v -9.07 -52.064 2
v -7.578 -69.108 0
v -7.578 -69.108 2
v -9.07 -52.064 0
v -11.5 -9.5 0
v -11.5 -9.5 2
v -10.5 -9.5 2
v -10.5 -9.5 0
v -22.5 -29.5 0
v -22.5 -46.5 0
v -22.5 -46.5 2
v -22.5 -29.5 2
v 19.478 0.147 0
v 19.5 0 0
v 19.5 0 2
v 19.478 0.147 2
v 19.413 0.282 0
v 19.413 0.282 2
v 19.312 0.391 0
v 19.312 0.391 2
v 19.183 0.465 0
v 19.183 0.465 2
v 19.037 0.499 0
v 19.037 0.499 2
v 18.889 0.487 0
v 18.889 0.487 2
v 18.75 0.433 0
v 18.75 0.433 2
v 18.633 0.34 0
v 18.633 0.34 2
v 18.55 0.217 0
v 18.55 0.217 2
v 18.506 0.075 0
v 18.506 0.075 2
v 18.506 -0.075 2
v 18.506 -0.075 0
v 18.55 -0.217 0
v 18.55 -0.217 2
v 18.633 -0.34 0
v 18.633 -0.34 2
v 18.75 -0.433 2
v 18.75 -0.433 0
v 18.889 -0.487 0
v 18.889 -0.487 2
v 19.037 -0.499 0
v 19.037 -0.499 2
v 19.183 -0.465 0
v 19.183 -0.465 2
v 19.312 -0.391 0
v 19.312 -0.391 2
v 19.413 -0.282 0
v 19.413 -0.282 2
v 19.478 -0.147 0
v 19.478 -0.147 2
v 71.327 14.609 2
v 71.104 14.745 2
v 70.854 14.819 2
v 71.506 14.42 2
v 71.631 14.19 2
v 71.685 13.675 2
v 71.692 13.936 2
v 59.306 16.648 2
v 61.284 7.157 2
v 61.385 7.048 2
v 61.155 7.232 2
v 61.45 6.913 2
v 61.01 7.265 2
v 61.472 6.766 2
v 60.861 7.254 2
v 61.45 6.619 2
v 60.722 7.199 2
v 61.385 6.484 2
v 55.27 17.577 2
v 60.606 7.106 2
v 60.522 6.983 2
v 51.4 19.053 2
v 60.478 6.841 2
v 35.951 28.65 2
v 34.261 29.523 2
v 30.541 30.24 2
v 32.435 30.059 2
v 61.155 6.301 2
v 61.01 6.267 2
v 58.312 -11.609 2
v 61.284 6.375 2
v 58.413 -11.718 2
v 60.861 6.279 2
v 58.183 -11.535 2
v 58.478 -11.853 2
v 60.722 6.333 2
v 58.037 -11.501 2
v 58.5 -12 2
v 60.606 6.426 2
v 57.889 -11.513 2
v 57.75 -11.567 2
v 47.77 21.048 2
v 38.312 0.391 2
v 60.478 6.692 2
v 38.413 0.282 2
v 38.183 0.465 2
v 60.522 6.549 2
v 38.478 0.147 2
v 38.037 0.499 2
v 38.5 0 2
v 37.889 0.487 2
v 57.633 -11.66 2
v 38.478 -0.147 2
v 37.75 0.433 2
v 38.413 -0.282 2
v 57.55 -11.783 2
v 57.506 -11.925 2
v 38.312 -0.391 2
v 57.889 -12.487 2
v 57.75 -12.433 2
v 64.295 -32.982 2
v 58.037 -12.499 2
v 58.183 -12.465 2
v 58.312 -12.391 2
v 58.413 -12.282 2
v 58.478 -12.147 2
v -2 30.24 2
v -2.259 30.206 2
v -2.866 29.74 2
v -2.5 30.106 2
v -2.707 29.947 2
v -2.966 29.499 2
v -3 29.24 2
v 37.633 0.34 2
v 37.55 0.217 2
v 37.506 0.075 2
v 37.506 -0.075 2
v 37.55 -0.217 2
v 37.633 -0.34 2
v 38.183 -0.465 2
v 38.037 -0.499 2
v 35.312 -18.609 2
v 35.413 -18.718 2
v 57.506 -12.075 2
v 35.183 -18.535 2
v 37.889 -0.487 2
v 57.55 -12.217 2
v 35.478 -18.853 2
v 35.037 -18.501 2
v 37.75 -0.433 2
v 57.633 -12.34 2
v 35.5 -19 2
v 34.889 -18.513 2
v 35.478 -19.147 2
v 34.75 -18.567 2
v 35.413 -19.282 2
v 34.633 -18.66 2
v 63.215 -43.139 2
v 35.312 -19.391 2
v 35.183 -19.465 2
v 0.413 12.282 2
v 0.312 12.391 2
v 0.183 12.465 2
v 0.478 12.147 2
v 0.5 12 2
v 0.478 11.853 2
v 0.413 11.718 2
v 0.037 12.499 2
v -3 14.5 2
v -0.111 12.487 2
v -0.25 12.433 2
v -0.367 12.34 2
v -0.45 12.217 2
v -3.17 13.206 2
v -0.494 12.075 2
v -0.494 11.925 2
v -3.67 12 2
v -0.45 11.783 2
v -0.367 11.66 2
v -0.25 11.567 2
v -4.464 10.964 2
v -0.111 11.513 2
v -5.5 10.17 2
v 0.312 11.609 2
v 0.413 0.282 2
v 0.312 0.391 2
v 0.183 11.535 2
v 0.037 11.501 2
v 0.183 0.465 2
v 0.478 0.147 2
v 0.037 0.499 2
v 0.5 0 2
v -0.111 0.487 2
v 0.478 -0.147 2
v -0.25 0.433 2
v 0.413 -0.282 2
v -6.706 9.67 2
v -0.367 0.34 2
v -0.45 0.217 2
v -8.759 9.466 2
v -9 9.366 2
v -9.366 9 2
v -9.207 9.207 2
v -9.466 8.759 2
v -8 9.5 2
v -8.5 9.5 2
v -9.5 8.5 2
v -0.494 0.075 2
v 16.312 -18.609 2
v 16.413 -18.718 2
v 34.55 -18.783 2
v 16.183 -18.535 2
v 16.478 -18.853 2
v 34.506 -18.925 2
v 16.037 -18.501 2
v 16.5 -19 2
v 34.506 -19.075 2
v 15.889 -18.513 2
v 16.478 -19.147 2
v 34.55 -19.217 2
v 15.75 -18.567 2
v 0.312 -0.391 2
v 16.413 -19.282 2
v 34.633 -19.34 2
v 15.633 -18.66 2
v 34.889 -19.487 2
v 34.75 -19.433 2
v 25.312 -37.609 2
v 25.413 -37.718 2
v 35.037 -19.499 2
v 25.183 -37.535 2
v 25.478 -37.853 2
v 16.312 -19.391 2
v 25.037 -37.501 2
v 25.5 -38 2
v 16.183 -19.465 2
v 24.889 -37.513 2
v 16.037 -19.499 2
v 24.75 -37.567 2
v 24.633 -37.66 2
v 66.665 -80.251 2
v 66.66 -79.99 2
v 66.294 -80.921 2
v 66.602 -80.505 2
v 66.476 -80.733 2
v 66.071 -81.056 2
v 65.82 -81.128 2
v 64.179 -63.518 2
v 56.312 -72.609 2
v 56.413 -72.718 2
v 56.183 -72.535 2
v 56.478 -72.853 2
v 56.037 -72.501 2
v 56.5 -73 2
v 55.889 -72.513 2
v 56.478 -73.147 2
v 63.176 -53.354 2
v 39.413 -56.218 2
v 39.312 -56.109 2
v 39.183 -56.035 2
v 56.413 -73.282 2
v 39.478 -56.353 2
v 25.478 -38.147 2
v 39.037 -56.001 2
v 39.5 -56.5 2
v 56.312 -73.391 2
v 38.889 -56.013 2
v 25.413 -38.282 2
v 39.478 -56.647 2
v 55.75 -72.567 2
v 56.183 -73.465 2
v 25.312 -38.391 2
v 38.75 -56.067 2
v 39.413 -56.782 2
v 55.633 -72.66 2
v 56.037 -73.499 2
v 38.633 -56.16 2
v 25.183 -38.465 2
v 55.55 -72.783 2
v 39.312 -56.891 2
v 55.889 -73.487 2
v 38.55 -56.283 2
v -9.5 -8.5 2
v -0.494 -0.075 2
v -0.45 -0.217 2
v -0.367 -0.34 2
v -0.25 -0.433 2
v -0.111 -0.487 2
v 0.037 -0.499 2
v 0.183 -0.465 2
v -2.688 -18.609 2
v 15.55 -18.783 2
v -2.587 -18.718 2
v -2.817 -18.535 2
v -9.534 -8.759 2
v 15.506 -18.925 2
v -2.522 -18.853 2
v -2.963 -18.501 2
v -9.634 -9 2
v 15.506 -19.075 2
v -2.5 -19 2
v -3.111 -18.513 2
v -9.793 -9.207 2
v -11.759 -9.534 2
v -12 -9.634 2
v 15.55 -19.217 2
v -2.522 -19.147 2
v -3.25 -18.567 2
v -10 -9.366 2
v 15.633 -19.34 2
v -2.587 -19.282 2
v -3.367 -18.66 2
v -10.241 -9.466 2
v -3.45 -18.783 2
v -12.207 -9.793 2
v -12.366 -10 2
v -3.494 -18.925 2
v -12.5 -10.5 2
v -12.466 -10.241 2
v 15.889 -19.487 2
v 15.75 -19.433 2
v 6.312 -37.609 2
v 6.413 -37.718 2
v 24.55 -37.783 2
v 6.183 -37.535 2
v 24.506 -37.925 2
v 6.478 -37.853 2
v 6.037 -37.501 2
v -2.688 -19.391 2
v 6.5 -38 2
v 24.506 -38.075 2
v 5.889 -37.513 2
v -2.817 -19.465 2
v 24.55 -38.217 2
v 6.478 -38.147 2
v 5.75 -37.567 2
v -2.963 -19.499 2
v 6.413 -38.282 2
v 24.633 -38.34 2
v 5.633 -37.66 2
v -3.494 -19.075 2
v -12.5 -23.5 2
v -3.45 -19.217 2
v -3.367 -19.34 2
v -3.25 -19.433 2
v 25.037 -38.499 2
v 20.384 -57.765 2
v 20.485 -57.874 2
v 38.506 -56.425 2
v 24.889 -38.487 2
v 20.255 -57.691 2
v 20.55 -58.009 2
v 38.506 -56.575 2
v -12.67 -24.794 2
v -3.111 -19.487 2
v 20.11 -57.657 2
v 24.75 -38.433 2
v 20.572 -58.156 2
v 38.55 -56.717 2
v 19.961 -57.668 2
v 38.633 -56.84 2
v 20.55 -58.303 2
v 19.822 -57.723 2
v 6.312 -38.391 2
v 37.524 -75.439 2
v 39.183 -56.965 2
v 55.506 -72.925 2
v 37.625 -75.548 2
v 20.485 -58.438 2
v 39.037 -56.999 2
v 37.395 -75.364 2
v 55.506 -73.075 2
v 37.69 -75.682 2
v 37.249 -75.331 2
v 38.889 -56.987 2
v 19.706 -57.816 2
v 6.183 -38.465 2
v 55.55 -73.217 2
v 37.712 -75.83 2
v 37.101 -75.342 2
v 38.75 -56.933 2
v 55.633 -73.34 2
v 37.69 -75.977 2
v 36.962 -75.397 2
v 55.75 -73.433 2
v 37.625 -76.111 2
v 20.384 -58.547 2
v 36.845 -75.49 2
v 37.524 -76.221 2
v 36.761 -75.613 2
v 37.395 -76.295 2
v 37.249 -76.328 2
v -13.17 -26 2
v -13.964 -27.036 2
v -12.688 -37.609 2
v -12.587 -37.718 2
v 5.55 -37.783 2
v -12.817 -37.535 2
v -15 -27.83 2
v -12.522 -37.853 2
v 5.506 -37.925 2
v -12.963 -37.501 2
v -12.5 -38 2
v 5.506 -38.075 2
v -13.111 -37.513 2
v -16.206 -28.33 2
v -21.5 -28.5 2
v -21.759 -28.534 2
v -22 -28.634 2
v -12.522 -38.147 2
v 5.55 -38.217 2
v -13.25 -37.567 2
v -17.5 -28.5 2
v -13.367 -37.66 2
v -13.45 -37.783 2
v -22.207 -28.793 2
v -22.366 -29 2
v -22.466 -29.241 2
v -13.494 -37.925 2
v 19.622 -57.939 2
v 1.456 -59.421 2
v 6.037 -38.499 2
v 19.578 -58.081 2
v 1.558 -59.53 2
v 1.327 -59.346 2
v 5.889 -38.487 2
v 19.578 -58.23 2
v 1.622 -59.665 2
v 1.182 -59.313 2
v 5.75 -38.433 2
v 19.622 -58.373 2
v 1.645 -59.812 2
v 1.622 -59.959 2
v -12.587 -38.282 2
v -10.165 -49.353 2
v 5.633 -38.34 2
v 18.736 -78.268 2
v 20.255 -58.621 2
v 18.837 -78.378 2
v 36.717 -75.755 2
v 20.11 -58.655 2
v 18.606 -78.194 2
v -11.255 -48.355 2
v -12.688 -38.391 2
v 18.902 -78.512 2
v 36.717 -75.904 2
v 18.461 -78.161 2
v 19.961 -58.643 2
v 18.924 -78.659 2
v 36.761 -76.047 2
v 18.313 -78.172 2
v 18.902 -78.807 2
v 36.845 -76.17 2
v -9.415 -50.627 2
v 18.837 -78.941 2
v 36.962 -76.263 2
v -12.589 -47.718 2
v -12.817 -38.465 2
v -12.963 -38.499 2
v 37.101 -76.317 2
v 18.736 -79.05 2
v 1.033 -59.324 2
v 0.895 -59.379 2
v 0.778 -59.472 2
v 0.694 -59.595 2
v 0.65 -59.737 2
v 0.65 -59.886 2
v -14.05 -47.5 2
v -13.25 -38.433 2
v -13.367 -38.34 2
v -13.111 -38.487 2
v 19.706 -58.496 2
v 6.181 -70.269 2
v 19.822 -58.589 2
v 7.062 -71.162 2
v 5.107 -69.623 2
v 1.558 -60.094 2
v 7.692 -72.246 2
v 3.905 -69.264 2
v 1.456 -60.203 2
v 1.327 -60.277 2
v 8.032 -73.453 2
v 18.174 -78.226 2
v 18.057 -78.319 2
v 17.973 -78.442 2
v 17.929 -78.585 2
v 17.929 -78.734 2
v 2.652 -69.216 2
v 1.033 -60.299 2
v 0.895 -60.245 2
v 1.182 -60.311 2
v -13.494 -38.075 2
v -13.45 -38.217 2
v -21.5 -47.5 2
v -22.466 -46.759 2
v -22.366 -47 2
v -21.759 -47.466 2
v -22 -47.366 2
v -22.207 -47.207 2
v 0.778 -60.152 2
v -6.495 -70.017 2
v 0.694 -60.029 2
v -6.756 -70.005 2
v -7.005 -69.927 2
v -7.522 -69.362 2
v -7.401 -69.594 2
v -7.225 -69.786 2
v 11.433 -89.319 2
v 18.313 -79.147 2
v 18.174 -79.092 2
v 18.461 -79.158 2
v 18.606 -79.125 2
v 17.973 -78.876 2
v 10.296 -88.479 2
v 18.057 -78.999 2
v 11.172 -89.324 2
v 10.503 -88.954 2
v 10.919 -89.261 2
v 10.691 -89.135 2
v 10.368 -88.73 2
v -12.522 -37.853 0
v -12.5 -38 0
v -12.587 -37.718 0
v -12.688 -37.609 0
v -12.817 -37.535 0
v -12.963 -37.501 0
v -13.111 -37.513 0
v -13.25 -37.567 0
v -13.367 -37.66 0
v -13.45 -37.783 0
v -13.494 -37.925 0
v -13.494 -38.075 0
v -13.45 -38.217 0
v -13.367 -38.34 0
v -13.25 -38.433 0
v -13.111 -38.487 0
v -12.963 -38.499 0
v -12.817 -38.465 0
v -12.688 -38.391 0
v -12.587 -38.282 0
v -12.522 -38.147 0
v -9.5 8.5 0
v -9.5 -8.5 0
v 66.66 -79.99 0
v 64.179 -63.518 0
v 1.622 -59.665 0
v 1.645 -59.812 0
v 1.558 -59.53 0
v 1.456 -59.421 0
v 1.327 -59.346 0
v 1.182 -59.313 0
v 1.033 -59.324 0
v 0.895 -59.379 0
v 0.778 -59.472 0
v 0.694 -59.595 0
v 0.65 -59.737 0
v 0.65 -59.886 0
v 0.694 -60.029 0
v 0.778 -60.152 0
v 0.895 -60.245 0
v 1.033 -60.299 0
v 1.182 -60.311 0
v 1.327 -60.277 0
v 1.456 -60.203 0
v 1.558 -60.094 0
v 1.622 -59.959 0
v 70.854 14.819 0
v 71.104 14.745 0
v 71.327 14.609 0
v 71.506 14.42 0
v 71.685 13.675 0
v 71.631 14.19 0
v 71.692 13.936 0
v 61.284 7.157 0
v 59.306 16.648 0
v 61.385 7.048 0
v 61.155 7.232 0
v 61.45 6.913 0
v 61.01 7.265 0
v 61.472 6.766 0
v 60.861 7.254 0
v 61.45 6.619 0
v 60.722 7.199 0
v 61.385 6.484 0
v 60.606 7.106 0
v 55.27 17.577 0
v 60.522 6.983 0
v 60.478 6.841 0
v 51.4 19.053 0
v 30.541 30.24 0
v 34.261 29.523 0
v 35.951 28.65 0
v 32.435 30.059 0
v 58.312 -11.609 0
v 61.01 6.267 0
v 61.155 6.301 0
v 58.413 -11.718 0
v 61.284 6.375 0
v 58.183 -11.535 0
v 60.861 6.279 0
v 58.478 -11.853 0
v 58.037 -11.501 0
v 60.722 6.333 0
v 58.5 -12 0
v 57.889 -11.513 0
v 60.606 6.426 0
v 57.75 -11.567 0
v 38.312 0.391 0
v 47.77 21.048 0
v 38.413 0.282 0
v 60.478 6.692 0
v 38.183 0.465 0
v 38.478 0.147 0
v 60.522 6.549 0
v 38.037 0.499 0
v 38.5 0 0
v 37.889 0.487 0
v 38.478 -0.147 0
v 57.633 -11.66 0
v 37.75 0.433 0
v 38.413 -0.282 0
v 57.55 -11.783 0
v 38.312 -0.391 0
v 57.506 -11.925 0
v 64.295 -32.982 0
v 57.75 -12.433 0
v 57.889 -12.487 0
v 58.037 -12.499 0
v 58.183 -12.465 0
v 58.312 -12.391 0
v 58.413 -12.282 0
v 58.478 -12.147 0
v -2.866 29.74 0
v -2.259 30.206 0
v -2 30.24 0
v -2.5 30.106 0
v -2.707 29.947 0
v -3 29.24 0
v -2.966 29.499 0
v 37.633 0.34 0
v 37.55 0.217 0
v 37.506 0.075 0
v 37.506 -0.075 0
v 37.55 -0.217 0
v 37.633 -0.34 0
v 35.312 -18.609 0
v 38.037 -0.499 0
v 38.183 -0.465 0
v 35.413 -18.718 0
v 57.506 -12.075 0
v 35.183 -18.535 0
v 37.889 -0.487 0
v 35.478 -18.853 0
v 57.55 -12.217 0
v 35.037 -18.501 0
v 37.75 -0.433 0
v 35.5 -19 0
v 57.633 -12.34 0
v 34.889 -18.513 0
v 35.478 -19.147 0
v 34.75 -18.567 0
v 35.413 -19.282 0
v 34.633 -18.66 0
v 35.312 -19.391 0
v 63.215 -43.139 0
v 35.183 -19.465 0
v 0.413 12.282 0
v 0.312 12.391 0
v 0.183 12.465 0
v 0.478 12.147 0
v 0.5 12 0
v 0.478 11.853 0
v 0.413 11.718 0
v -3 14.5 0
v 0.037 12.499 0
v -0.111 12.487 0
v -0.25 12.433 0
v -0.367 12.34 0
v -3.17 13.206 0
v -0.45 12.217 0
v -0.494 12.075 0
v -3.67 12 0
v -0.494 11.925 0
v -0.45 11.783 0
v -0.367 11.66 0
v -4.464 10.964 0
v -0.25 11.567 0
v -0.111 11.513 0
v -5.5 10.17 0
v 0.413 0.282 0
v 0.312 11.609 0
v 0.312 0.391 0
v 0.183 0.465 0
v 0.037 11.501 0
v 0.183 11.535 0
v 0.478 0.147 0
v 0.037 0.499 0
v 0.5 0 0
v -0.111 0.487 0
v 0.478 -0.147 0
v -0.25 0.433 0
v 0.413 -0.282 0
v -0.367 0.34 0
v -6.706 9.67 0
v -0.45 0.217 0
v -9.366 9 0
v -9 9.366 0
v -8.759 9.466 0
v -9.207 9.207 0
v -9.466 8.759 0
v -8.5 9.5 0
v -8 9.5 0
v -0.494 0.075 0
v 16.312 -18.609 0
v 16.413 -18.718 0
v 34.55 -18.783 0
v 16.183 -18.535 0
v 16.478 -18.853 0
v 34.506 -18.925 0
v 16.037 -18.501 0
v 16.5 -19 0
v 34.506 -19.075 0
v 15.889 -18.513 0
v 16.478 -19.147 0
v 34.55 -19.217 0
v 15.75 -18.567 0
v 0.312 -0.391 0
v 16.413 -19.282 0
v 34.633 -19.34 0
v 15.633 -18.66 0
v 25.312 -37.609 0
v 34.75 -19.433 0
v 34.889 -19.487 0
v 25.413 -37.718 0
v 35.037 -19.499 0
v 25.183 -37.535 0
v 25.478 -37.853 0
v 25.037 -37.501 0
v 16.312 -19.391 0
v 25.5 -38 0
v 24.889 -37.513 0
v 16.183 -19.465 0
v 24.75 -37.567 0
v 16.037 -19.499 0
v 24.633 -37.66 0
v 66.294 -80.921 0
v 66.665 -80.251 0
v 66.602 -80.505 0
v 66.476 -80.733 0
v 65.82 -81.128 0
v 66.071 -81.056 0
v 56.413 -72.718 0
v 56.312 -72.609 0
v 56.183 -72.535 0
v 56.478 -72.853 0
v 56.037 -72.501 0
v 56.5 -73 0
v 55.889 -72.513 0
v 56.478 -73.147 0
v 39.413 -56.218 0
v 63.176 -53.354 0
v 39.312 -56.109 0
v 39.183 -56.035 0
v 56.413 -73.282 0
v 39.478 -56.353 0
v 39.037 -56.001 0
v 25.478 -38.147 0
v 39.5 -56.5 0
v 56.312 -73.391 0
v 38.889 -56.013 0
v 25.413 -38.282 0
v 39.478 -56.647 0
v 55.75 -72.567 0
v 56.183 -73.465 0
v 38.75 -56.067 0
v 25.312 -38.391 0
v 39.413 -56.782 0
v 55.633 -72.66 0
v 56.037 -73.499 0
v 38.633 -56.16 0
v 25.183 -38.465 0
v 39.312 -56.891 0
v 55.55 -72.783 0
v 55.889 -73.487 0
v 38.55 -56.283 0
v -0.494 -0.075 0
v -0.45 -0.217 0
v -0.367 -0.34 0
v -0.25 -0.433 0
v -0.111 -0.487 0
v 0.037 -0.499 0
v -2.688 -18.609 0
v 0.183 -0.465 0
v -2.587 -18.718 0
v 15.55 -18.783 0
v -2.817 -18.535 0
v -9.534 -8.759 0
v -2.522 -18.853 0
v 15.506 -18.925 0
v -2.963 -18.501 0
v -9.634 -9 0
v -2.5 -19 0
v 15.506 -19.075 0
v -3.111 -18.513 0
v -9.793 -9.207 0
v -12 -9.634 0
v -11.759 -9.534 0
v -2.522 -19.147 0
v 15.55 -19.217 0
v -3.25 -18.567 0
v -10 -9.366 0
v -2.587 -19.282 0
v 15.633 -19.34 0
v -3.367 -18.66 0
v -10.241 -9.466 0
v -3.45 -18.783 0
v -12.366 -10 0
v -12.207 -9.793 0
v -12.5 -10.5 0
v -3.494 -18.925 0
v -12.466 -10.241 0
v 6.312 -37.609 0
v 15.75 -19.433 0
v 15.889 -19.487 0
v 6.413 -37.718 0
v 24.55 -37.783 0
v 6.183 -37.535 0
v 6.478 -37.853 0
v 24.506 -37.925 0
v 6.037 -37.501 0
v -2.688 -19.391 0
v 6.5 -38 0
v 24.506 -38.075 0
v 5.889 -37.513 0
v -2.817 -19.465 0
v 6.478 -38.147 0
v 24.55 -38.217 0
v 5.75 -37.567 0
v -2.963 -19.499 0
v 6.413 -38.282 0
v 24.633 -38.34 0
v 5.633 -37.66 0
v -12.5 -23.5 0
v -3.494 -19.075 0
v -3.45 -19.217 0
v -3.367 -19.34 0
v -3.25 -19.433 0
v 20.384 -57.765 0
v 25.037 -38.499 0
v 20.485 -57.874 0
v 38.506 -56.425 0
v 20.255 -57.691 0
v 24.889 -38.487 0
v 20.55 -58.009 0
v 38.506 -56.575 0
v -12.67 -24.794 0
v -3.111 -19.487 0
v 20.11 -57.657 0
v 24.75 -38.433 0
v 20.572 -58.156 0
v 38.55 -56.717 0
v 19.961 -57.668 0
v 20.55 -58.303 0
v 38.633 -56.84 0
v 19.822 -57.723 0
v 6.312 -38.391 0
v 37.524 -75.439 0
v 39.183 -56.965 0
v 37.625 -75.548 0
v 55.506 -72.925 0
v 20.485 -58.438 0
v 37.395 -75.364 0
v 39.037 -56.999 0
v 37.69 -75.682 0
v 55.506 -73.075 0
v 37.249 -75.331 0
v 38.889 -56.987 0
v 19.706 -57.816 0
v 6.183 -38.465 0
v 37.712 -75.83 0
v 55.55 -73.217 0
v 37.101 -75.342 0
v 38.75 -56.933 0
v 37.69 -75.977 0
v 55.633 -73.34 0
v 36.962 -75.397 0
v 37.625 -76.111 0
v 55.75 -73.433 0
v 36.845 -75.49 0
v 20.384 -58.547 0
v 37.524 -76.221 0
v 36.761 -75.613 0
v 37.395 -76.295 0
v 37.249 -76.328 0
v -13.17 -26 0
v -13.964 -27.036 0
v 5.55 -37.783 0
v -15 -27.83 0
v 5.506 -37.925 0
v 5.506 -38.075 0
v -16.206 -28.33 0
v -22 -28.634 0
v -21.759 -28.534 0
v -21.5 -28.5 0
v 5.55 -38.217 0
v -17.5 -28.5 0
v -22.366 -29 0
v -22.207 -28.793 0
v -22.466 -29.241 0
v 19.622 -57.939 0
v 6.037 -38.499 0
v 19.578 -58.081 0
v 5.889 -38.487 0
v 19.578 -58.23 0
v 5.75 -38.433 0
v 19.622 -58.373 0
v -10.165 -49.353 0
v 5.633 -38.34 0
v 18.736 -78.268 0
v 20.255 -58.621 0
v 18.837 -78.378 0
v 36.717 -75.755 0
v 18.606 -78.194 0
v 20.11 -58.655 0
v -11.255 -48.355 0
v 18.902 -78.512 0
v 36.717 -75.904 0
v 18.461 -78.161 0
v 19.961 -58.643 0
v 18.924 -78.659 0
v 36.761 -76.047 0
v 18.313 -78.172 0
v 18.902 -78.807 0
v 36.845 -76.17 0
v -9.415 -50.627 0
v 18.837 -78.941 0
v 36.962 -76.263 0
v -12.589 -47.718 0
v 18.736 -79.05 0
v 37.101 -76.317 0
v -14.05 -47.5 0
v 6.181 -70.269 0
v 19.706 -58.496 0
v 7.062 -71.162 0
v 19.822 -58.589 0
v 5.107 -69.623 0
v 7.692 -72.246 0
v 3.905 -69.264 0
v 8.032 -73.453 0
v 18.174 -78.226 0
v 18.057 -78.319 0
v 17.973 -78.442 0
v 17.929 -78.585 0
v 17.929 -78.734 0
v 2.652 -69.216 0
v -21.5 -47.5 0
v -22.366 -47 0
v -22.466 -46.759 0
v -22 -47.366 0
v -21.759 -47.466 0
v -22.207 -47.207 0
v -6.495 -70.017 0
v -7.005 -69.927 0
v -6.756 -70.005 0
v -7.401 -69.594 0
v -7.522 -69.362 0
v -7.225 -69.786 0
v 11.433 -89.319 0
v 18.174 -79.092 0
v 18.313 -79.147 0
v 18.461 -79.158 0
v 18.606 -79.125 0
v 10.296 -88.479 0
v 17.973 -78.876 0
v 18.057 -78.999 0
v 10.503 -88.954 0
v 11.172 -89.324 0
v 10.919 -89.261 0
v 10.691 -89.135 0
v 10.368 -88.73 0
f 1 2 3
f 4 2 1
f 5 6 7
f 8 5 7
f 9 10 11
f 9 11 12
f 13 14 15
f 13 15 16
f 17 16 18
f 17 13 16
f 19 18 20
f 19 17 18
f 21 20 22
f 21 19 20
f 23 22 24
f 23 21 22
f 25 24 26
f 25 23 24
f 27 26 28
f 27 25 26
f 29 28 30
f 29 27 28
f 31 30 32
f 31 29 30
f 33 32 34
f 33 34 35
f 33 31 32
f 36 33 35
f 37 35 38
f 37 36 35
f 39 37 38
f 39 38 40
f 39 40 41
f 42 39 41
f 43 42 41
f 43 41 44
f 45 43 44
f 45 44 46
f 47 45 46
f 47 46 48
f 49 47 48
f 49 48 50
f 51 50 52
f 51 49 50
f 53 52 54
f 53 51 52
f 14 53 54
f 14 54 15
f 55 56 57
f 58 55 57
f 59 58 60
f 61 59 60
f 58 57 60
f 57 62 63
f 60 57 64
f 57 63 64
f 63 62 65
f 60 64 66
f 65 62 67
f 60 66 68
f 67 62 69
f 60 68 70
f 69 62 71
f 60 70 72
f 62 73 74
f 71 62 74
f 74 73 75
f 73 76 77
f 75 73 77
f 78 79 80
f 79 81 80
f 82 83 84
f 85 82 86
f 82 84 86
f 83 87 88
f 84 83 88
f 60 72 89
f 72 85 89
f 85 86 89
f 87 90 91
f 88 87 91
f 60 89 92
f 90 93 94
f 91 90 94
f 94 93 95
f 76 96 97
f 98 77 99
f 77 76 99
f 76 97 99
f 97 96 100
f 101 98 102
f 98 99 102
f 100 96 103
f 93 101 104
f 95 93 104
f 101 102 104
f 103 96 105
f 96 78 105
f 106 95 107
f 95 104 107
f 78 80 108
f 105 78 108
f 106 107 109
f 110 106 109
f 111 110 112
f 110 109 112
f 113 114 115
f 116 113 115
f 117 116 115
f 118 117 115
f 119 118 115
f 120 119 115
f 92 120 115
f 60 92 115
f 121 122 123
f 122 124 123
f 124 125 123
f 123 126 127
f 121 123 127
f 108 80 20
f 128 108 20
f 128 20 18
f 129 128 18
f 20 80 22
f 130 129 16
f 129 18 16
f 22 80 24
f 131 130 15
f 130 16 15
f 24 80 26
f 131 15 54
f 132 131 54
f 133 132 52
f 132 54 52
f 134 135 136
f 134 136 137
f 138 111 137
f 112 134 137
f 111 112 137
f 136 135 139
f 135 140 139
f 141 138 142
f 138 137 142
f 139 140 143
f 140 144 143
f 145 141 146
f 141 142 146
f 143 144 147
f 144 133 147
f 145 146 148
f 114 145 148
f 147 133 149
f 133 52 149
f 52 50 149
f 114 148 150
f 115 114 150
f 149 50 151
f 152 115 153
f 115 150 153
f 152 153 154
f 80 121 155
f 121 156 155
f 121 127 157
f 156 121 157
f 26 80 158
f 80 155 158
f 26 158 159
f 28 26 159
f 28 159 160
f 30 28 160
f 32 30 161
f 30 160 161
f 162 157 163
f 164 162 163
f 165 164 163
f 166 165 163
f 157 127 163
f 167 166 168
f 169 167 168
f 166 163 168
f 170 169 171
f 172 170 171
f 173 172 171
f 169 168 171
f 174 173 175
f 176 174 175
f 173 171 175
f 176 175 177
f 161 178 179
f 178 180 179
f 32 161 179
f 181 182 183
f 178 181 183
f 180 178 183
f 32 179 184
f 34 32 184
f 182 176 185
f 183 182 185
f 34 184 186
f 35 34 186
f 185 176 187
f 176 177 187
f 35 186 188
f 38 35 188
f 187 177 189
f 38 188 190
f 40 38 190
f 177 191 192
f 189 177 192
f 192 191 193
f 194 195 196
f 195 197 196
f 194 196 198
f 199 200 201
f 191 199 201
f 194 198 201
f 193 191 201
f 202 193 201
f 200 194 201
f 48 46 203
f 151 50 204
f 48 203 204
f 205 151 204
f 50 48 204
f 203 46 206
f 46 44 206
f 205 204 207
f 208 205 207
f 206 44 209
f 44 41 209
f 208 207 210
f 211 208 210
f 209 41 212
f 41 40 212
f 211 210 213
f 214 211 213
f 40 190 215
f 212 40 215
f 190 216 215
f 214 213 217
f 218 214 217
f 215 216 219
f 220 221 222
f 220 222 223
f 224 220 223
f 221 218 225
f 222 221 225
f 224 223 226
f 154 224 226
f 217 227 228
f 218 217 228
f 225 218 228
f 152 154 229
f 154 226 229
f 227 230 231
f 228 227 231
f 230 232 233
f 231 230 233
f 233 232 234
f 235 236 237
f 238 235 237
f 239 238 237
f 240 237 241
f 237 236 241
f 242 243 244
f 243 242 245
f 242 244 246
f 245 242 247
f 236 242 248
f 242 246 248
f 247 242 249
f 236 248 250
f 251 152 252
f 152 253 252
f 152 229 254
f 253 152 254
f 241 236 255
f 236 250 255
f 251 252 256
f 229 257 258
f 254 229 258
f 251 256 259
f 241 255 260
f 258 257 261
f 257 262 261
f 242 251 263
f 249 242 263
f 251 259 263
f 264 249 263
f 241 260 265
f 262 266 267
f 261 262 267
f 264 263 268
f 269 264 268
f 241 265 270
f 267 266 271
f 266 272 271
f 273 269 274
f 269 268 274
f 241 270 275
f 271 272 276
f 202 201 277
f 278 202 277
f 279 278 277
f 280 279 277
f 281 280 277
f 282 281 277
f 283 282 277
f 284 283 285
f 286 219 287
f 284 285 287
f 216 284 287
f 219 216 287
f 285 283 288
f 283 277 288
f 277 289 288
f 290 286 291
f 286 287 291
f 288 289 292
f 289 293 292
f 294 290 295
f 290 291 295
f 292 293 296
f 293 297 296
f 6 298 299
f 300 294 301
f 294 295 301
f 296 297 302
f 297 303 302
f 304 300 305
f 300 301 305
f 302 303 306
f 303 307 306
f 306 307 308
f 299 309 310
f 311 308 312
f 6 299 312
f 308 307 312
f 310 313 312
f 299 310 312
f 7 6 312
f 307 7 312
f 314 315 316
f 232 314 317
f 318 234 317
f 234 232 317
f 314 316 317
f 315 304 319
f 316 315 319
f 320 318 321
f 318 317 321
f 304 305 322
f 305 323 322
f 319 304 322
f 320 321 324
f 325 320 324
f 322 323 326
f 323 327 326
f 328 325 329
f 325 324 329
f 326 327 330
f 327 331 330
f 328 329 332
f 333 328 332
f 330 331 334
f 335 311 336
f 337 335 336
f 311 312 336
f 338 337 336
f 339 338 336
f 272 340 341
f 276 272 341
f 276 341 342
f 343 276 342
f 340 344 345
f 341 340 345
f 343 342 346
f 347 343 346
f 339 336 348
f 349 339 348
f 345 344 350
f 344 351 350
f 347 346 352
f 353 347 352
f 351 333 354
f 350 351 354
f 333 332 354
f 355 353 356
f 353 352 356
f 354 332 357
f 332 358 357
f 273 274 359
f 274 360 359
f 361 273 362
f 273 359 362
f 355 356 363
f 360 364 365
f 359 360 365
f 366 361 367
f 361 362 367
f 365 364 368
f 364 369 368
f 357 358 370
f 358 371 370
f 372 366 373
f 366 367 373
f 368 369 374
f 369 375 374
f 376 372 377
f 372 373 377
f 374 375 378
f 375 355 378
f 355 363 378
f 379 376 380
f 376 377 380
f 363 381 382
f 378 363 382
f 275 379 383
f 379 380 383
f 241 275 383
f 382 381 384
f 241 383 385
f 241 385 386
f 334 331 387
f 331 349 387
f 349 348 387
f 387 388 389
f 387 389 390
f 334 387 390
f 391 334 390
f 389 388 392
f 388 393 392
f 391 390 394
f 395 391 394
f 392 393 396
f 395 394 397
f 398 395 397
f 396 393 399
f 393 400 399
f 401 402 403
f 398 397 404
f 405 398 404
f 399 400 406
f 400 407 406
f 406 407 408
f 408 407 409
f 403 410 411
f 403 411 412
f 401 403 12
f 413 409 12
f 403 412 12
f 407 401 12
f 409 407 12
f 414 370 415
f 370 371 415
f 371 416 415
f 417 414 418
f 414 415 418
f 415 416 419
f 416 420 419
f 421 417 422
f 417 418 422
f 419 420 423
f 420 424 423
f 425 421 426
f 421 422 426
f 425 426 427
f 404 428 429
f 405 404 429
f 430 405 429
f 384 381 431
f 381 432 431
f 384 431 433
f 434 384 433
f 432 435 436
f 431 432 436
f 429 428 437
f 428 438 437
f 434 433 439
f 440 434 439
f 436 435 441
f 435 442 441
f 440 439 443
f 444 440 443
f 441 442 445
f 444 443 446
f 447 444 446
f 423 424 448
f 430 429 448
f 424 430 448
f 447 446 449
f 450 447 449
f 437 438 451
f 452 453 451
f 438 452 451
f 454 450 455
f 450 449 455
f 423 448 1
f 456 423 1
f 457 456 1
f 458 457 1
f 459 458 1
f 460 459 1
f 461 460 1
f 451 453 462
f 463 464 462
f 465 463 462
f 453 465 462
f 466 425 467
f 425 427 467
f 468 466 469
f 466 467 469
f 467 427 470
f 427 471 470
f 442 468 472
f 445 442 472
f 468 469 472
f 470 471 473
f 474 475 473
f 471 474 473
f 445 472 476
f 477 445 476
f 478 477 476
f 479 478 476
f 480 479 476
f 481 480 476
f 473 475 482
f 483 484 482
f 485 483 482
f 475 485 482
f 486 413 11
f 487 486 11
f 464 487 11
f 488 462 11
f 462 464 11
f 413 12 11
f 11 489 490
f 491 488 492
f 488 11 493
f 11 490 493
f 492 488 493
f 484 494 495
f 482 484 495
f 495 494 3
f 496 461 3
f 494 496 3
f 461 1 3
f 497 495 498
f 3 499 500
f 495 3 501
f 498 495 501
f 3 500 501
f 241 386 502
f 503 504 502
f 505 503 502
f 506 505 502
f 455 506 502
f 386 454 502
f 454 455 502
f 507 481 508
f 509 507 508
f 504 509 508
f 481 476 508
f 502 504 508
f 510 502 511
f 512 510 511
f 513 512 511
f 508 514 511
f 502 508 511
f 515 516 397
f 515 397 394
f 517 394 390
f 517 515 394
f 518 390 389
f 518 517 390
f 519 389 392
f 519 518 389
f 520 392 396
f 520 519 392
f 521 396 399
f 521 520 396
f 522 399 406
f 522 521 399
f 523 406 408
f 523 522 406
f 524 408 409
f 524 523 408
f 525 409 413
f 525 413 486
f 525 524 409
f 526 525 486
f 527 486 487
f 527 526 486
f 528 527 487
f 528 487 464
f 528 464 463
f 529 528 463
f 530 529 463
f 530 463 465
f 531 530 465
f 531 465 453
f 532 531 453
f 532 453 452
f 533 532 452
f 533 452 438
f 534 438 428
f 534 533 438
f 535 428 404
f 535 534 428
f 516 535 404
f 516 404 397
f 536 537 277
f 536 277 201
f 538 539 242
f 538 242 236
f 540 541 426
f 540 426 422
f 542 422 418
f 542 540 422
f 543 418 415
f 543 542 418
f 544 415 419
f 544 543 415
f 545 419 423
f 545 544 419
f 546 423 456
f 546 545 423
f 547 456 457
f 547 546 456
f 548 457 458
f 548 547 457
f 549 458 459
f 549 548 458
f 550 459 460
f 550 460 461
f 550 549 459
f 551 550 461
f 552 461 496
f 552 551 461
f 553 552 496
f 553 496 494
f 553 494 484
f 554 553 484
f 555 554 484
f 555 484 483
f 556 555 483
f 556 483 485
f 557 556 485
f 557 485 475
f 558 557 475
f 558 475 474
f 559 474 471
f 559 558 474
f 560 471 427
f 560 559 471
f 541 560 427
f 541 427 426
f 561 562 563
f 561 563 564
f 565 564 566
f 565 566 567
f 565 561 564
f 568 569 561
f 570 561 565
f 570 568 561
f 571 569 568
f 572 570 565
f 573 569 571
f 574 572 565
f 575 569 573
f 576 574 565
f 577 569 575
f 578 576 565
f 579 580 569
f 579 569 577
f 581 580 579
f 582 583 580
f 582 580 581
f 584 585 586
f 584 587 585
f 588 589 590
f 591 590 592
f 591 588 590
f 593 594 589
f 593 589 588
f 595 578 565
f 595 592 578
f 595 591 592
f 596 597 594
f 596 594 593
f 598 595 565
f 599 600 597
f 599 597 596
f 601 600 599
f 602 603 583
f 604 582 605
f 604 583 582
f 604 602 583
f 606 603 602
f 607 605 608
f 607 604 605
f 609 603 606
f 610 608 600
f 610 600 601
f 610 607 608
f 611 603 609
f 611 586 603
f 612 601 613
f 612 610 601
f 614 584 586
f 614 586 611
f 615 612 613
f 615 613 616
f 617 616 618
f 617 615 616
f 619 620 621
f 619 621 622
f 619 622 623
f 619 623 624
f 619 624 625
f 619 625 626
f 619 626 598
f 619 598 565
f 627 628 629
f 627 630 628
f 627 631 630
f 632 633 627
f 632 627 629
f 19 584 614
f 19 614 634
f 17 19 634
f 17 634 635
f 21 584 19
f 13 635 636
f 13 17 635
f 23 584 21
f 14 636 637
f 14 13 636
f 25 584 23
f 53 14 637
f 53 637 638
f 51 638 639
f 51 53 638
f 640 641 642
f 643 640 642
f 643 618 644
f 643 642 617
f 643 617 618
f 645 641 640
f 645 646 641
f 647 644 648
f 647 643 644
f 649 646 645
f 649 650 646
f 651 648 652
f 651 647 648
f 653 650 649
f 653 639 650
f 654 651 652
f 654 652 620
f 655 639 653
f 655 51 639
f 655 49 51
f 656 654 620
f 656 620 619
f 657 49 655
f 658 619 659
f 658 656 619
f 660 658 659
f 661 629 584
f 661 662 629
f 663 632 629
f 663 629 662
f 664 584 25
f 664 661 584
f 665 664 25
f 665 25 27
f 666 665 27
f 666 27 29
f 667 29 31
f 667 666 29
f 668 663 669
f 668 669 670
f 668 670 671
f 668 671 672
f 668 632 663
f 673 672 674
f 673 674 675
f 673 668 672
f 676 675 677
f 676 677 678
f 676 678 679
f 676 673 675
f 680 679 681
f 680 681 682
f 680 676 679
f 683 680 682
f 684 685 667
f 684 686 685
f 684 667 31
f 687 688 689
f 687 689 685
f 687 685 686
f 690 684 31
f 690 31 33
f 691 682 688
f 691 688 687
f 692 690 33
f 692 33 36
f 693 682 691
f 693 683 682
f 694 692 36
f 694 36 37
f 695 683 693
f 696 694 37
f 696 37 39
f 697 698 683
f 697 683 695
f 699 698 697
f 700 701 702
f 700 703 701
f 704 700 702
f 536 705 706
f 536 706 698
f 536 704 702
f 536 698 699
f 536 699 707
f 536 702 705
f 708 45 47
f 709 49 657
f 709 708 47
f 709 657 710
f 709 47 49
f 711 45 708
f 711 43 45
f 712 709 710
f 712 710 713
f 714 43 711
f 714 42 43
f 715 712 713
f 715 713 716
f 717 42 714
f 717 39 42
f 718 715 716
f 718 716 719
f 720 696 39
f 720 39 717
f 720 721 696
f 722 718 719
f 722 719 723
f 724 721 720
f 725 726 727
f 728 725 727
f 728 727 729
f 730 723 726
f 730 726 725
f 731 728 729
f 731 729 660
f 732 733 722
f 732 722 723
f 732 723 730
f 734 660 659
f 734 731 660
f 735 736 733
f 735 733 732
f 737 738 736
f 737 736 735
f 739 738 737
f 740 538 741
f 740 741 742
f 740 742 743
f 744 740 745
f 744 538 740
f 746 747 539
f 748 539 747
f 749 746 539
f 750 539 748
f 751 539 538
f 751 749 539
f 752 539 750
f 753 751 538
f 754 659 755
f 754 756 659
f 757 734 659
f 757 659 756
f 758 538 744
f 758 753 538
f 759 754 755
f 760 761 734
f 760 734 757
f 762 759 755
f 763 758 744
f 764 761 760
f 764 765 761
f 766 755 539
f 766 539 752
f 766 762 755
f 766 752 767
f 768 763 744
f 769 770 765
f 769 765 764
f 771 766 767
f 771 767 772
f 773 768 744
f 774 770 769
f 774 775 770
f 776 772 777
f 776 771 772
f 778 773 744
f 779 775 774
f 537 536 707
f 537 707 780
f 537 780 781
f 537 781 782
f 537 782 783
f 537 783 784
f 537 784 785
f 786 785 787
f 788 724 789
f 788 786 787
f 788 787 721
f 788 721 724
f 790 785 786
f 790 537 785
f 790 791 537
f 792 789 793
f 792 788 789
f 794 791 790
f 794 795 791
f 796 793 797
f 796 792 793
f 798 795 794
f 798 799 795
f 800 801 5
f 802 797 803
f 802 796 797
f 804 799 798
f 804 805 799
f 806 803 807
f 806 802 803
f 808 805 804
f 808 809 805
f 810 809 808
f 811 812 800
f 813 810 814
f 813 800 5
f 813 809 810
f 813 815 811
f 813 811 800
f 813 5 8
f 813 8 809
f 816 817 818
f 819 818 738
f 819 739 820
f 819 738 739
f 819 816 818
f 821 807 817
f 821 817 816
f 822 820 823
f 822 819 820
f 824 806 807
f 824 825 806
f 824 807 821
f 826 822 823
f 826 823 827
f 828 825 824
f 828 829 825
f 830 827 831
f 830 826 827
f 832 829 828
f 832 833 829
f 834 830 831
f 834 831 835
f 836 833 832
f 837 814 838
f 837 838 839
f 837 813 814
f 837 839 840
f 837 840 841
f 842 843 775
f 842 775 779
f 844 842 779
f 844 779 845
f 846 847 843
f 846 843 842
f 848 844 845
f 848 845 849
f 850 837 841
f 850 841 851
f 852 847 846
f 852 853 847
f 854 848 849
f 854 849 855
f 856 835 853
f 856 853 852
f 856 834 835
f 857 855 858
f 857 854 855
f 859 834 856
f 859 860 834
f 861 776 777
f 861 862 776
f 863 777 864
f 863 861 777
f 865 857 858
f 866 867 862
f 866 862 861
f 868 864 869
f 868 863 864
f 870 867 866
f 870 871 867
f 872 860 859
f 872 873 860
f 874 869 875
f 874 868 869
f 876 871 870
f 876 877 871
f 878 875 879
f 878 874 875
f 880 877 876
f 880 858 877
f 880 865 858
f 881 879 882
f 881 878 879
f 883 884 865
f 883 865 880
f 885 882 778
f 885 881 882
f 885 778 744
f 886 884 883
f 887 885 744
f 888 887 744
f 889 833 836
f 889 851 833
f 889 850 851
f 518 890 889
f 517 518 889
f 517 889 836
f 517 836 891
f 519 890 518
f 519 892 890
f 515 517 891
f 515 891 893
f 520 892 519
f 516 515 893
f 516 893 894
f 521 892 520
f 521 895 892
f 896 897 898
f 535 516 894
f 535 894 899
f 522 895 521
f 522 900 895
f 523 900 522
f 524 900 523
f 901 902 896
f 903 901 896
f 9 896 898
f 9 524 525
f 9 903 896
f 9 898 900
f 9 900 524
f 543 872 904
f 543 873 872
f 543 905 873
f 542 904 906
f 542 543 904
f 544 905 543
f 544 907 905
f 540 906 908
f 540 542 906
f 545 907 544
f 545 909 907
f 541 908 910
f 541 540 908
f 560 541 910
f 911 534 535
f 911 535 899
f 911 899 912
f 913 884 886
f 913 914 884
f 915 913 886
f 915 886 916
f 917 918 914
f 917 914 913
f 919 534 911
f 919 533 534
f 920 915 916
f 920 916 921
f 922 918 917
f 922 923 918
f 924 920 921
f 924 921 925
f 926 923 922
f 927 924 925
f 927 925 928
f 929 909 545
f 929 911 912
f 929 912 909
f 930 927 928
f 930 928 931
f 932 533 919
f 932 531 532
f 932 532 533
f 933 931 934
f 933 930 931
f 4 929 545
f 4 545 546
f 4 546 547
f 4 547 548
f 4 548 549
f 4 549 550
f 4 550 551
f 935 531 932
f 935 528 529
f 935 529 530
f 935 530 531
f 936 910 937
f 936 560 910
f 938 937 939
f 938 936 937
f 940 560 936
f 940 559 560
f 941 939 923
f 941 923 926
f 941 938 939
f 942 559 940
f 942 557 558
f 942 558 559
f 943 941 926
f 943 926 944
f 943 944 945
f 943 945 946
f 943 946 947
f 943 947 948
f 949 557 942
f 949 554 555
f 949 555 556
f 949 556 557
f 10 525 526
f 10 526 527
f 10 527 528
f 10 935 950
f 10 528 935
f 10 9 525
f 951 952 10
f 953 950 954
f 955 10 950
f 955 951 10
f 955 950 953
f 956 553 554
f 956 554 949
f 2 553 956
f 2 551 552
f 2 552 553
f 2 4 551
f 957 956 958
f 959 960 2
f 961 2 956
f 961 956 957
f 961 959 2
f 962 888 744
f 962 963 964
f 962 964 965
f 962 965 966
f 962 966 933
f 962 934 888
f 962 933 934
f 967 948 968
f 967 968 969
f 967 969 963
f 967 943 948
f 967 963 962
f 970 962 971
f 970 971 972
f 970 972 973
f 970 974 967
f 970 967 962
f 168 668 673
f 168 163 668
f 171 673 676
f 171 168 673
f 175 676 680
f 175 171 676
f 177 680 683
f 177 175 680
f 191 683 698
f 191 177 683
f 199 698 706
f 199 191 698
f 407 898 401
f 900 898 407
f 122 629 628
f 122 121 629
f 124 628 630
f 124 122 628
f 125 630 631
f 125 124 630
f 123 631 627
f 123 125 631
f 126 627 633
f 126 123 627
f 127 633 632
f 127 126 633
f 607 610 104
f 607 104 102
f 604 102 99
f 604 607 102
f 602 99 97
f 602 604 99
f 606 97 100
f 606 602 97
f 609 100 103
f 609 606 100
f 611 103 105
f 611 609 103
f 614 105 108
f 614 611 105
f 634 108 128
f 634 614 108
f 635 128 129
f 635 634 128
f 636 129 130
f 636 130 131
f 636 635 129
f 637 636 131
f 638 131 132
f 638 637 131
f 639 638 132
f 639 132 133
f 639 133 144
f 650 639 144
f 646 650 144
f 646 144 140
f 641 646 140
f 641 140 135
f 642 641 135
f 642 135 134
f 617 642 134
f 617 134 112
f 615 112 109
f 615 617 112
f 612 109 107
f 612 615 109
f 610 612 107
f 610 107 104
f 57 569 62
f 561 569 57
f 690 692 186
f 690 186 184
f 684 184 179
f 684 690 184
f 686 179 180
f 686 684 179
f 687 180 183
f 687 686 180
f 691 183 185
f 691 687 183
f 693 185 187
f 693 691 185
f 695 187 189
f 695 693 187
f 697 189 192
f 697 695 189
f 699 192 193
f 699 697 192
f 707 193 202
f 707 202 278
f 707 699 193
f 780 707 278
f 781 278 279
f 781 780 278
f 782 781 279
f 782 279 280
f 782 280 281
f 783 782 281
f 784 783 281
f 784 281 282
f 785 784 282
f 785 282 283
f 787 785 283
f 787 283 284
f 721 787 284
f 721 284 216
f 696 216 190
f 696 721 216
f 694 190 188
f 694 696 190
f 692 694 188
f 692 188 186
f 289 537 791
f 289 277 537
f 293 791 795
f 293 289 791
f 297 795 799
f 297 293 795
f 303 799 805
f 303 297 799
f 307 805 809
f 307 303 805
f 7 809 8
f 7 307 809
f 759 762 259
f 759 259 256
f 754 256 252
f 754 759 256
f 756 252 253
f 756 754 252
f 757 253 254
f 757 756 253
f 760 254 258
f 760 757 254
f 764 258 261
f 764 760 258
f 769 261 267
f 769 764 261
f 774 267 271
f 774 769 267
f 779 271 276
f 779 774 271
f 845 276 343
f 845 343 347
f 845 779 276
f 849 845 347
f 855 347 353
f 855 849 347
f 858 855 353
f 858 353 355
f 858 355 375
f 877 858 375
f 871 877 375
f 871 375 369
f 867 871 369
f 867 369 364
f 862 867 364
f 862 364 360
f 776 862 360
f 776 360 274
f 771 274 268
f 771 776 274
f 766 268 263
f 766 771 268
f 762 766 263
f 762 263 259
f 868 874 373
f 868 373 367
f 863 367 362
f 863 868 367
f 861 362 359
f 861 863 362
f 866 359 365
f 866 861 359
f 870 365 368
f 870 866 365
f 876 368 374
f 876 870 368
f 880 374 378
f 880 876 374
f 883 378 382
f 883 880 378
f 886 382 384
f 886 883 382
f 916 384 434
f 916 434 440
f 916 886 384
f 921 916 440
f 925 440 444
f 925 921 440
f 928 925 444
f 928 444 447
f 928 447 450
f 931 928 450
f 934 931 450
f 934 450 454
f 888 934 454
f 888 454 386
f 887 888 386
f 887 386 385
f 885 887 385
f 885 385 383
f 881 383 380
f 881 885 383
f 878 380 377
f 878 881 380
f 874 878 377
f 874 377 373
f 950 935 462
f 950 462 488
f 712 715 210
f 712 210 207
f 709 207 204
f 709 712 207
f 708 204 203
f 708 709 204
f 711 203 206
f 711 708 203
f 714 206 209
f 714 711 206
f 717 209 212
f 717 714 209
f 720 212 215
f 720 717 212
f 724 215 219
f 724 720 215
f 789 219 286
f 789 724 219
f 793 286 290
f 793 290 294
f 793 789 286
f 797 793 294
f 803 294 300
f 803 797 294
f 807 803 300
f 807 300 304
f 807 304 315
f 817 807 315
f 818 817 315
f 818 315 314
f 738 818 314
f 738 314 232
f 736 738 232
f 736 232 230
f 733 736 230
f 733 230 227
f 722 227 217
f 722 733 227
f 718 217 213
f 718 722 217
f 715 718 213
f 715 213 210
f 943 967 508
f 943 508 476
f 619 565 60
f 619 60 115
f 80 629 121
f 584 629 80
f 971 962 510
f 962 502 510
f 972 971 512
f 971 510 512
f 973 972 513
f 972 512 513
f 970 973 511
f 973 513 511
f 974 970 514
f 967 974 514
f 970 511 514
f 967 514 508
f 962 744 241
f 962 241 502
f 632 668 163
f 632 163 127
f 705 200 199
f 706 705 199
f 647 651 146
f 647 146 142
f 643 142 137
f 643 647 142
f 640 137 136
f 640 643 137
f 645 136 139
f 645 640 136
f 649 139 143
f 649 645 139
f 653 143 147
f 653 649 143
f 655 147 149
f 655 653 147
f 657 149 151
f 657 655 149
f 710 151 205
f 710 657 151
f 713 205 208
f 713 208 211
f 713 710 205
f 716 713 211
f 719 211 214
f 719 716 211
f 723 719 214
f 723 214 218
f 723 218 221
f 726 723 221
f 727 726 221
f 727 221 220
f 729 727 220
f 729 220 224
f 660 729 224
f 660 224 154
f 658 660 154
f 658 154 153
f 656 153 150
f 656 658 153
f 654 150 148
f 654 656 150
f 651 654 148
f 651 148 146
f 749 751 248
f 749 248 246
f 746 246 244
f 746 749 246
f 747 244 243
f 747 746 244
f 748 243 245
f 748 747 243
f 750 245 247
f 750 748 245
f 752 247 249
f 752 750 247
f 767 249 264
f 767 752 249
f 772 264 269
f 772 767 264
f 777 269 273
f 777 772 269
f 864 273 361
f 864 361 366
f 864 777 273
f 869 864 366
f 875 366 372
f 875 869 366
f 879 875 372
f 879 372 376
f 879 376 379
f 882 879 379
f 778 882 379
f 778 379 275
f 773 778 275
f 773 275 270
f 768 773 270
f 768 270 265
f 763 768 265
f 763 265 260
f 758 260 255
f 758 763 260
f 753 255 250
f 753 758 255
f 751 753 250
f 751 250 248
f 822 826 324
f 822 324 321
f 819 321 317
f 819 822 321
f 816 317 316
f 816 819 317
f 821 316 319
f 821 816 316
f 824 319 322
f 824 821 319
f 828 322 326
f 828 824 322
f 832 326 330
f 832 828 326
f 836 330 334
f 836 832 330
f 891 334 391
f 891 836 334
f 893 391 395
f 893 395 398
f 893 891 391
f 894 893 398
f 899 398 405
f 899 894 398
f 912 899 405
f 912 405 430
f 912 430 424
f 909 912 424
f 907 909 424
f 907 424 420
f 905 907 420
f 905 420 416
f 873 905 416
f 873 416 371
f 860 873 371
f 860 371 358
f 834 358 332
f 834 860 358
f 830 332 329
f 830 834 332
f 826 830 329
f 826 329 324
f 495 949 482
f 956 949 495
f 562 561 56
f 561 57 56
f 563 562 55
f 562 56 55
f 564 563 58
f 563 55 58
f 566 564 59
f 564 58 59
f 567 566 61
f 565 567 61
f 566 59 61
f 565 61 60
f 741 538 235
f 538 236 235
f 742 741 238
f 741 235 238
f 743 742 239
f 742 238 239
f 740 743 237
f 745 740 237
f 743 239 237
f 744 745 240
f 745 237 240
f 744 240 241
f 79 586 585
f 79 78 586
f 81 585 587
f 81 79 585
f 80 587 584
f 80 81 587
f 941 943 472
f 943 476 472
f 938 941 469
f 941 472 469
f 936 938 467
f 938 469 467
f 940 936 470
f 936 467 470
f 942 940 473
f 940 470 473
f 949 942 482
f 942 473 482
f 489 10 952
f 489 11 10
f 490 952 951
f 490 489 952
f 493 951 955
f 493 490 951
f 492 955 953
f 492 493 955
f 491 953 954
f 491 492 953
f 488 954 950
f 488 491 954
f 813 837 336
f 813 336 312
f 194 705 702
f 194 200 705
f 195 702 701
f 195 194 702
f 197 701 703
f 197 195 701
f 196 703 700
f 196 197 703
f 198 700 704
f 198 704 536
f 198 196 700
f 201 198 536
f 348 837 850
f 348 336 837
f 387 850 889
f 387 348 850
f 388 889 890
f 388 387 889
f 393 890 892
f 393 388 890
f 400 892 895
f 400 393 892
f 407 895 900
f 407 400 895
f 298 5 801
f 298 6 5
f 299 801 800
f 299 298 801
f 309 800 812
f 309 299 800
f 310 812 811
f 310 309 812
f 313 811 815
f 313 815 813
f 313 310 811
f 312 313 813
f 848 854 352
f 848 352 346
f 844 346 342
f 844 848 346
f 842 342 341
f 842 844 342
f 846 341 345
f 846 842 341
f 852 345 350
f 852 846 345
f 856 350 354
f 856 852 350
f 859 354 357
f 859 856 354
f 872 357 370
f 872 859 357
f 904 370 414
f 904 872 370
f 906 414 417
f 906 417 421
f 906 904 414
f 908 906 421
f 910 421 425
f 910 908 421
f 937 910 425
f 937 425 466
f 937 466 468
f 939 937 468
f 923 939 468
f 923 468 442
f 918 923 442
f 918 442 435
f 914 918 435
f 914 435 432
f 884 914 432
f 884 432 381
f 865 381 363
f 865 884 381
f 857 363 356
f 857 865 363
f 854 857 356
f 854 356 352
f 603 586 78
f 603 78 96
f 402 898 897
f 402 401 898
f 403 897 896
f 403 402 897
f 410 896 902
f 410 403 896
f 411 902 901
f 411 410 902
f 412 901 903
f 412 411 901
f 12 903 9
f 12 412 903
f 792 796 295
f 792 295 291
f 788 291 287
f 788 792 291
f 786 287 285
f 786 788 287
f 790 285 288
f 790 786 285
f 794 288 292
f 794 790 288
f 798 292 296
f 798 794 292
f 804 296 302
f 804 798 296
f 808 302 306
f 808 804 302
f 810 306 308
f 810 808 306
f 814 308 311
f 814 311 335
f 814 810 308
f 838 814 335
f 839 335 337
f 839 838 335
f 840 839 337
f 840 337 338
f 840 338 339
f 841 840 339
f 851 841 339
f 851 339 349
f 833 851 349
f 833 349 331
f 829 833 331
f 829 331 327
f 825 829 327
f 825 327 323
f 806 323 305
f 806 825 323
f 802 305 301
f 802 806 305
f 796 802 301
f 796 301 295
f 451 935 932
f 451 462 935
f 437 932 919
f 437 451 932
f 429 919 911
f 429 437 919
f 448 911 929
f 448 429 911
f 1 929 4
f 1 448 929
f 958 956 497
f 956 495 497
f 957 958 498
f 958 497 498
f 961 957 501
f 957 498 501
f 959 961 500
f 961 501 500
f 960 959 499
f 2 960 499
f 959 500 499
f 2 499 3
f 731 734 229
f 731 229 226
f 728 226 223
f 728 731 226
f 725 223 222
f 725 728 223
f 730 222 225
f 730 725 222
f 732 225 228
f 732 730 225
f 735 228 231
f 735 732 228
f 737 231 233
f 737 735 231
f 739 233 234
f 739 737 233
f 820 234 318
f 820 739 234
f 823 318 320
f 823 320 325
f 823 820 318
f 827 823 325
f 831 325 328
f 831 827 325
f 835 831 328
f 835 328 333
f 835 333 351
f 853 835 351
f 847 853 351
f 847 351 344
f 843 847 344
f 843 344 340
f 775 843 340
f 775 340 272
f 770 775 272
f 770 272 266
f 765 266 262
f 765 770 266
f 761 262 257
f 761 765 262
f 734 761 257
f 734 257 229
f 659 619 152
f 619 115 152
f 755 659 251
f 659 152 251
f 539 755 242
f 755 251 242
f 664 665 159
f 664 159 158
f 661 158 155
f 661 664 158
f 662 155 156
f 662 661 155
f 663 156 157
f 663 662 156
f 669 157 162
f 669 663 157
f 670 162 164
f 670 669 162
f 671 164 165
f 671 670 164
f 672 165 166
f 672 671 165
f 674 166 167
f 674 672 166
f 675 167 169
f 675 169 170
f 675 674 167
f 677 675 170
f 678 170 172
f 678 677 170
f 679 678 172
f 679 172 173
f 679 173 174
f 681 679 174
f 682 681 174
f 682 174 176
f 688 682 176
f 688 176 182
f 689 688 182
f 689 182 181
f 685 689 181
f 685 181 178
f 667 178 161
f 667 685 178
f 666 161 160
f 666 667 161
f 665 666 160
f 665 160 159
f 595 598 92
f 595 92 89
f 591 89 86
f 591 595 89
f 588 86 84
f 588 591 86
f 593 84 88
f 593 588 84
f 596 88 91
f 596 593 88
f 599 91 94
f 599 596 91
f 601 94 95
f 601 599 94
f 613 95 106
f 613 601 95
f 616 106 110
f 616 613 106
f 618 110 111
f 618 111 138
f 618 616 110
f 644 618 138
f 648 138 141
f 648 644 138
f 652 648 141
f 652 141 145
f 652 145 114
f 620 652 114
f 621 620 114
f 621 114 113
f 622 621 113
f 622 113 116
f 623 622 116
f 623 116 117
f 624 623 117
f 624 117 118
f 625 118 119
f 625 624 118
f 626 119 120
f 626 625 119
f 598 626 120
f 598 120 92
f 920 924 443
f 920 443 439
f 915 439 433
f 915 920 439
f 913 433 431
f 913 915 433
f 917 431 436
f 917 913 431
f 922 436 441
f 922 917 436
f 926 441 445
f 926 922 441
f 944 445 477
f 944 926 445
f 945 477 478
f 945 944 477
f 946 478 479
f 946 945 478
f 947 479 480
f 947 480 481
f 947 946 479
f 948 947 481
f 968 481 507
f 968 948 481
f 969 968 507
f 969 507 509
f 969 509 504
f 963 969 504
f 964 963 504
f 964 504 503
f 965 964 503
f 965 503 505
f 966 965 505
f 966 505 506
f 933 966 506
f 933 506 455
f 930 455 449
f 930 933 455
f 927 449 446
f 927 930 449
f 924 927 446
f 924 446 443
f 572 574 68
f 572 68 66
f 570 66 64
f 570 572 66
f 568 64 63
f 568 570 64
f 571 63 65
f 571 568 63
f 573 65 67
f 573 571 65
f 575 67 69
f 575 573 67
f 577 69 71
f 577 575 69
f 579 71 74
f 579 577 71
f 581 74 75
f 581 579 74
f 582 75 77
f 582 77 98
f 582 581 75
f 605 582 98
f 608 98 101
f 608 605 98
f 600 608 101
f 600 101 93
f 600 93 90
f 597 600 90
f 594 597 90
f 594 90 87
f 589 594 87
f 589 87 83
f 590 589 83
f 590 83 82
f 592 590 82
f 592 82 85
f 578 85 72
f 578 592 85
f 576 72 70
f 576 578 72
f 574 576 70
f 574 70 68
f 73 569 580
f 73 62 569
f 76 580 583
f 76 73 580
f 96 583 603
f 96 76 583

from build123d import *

# Parameters (mm, degrees)
SKETCH1_R           = 0.5
BOSS_EXTRUDE1_DEPTH = 2
FILLET1_R           = 30
FILLET5_R           = 100
FILLET2_R           = 10
FILLET3_R           = 1
FILLET4_R           = 5


with BuildPart() as part:
    # Sketch1 → Boss-Extrude1 (new body)
    with BuildSketch(Plane(origin=(0, 0, 0), x_dir=(0, 1, 0), z_dir=(0, 0, 1))):
        Polygon((-89.468095407, -10.44451917), (-68.806810142, -7.332792233), (-70.103747412, 7.491268603), (-47.5, 9.468840255), (-47.5, 22.5), (-28.5, 22.5), (-28.5, 12.5), (-9.5, 12.5), (-9.5, 9.5), (9.5, 9.5), (9.5, 3), (30.24, 3), (30.24, -33.48), (17.635245125, -53.075343018), (14.662990289, -71.841421489), (-48.241456697, -61.878335859), (-80.979250129, -66.808865222), align=None)
        with Locations(Location((-56.5, -39, 0), (0, 0, 270))):
            Circle(SKETCH1_R, mode=Mode.SUBTRACT)
        with Locations(Location((-73, -56, 0), (0, 0, 270))):
            Circle(SKETCH1_R, mode=Mode.SUBTRACT)
        with Locations(Location((0, 0, 0), (0, 0, 270))):
            Circle(SKETCH1_R, mode=Mode.SUBTRACT)
        with Locations(Location((-38, 13, 0), (0, 0, 270))):
            Circle(SKETCH1_R, mode=Mode.SUBTRACT)
        with Locations(Location((-19, 3, 0), (0, 0, 270))):
            Circle(SKETCH1_R, mode=Mode.SUBTRACT)
        with Locations(Location((12, 0, 0), (0, 0, 270))):
            Circle(SKETCH1_R, mode=Mode.SUBTRACT)
        with Locations(Location((-12, -58, 0), (0, 0, 270))):
            Circle(SKETCH1_R, mode=Mode.SUBTRACT)
        with Locations(Location((0, -19, 0), (0, 0, 270))):
            Circle(SKETCH1_R, mode=Mode.SUBTRACT)
        with Locations(Location((-19, -16, 0), (0, 0, 270))):
            Circle(SKETCH1_R, mode=Mode.SUBTRACT)
        with Locations(Location((-38, -6, 0), (0, 0, 270))):
            Circle(SKETCH1_R, mode=Mode.SUBTRACT)
        with Locations(Location((0, -38, 0), (0, 0, 270))):
            Circle(SKETCH1_R, mode=Mode.SUBTRACT)
        with Locations(Location((-19, -35, 0), (0, 0, 270))):
            Circle(SKETCH1_R, mode=Mode.SUBTRACT)
        with Locations(Location((-38, -25, 0), (0, 0, 270))):
            Circle(SKETCH1_R, mode=Mode.SUBTRACT)
        with Locations(Location((-58.155959112, -20.072300736, 0), (0, 0, 270))):
            Circle(SKETCH1_R, mode=Mode.SUBTRACT)
        with Locations(Location((-59.811918224, -1.144601473, 0), (0, 0, 270))):
            Circle(SKETCH1_R, mode=Mode.SUBTRACT)
        with Locations(Location((-75.829615093, -37.211884649, 0), (0, 0, 270))):
            Circle(SKETCH1_R, mode=Mode.SUBTRACT)
        with Locations(Location((-78.659230186, -18.423769299, 0), (0, 0, 270))):
            Circle(SKETCH1_R, mode=Mode.SUBTRACT)
        with Locations(Location((6.766078471, -60.972254836, 0), (0, 0, 270))):
            Circle(SKETCH1_R, mode=Mode.SUBTRACT)
    extrude(amount=BOSS_EXTRUDE1_DEPTH)

    # Fillet1
    fillet1_edges = [part.edges().sort_by_distance(p)[0] for p in [
        (53.075343018, 17.635245125, 1),
    ]]
    fillet(fillet1_edges, radius=FILLET1_R)

    # Fillet5
    fillet5_edges = [part.edges().sort_by_distance(p)[0] for p in [
        (61.878335859, -48.241456697, 1),
    ]]
    fillet(fillet5_edges, radius=FILLET5_R)

    # Fillet2
    fillet2_edges = [part.edges().sort_by_distance(p)[0] for p in [
        (33.48, 30.24, 1),
    ]]
    fillet(fillet2_edges, radius=FILLET2_R)

    # Fillet3
    fillet3_edges = [part.edges().sort_by_distance(p)[0] for p in [
        (10.44451917, -89.468095407, 1),
        (-7.491268603, -70.103747412, 1),
        (-22.5, -47.5, 1),
        (-22.5, -28.5, 1),
        (-12.5, -9.5, 1),
        (-9.5, -9.5, 1),
        (-9.5, 9.5, 1),
        (-3, 30.24, 1),
        (71.841421489, 14.662990289, 1),
        (66.808865222, -80.979250129, 1),
    ]]
    fillet(fillet3_edges, radius=FILLET3_R)

    # Fillet4
    fillet4_edges = [part.edges().sort_by_distance(p)[0] for p in [
        (7.332792233, -68.806810142, 1),
        (-9.468840255, -47.5, 1),
        (-12.5, -28.5, 1),
        (-3, 9.5, 1),
    ]]
    fillet(fillet4_edges, radius=FILLET4_R)


solid = part.part
